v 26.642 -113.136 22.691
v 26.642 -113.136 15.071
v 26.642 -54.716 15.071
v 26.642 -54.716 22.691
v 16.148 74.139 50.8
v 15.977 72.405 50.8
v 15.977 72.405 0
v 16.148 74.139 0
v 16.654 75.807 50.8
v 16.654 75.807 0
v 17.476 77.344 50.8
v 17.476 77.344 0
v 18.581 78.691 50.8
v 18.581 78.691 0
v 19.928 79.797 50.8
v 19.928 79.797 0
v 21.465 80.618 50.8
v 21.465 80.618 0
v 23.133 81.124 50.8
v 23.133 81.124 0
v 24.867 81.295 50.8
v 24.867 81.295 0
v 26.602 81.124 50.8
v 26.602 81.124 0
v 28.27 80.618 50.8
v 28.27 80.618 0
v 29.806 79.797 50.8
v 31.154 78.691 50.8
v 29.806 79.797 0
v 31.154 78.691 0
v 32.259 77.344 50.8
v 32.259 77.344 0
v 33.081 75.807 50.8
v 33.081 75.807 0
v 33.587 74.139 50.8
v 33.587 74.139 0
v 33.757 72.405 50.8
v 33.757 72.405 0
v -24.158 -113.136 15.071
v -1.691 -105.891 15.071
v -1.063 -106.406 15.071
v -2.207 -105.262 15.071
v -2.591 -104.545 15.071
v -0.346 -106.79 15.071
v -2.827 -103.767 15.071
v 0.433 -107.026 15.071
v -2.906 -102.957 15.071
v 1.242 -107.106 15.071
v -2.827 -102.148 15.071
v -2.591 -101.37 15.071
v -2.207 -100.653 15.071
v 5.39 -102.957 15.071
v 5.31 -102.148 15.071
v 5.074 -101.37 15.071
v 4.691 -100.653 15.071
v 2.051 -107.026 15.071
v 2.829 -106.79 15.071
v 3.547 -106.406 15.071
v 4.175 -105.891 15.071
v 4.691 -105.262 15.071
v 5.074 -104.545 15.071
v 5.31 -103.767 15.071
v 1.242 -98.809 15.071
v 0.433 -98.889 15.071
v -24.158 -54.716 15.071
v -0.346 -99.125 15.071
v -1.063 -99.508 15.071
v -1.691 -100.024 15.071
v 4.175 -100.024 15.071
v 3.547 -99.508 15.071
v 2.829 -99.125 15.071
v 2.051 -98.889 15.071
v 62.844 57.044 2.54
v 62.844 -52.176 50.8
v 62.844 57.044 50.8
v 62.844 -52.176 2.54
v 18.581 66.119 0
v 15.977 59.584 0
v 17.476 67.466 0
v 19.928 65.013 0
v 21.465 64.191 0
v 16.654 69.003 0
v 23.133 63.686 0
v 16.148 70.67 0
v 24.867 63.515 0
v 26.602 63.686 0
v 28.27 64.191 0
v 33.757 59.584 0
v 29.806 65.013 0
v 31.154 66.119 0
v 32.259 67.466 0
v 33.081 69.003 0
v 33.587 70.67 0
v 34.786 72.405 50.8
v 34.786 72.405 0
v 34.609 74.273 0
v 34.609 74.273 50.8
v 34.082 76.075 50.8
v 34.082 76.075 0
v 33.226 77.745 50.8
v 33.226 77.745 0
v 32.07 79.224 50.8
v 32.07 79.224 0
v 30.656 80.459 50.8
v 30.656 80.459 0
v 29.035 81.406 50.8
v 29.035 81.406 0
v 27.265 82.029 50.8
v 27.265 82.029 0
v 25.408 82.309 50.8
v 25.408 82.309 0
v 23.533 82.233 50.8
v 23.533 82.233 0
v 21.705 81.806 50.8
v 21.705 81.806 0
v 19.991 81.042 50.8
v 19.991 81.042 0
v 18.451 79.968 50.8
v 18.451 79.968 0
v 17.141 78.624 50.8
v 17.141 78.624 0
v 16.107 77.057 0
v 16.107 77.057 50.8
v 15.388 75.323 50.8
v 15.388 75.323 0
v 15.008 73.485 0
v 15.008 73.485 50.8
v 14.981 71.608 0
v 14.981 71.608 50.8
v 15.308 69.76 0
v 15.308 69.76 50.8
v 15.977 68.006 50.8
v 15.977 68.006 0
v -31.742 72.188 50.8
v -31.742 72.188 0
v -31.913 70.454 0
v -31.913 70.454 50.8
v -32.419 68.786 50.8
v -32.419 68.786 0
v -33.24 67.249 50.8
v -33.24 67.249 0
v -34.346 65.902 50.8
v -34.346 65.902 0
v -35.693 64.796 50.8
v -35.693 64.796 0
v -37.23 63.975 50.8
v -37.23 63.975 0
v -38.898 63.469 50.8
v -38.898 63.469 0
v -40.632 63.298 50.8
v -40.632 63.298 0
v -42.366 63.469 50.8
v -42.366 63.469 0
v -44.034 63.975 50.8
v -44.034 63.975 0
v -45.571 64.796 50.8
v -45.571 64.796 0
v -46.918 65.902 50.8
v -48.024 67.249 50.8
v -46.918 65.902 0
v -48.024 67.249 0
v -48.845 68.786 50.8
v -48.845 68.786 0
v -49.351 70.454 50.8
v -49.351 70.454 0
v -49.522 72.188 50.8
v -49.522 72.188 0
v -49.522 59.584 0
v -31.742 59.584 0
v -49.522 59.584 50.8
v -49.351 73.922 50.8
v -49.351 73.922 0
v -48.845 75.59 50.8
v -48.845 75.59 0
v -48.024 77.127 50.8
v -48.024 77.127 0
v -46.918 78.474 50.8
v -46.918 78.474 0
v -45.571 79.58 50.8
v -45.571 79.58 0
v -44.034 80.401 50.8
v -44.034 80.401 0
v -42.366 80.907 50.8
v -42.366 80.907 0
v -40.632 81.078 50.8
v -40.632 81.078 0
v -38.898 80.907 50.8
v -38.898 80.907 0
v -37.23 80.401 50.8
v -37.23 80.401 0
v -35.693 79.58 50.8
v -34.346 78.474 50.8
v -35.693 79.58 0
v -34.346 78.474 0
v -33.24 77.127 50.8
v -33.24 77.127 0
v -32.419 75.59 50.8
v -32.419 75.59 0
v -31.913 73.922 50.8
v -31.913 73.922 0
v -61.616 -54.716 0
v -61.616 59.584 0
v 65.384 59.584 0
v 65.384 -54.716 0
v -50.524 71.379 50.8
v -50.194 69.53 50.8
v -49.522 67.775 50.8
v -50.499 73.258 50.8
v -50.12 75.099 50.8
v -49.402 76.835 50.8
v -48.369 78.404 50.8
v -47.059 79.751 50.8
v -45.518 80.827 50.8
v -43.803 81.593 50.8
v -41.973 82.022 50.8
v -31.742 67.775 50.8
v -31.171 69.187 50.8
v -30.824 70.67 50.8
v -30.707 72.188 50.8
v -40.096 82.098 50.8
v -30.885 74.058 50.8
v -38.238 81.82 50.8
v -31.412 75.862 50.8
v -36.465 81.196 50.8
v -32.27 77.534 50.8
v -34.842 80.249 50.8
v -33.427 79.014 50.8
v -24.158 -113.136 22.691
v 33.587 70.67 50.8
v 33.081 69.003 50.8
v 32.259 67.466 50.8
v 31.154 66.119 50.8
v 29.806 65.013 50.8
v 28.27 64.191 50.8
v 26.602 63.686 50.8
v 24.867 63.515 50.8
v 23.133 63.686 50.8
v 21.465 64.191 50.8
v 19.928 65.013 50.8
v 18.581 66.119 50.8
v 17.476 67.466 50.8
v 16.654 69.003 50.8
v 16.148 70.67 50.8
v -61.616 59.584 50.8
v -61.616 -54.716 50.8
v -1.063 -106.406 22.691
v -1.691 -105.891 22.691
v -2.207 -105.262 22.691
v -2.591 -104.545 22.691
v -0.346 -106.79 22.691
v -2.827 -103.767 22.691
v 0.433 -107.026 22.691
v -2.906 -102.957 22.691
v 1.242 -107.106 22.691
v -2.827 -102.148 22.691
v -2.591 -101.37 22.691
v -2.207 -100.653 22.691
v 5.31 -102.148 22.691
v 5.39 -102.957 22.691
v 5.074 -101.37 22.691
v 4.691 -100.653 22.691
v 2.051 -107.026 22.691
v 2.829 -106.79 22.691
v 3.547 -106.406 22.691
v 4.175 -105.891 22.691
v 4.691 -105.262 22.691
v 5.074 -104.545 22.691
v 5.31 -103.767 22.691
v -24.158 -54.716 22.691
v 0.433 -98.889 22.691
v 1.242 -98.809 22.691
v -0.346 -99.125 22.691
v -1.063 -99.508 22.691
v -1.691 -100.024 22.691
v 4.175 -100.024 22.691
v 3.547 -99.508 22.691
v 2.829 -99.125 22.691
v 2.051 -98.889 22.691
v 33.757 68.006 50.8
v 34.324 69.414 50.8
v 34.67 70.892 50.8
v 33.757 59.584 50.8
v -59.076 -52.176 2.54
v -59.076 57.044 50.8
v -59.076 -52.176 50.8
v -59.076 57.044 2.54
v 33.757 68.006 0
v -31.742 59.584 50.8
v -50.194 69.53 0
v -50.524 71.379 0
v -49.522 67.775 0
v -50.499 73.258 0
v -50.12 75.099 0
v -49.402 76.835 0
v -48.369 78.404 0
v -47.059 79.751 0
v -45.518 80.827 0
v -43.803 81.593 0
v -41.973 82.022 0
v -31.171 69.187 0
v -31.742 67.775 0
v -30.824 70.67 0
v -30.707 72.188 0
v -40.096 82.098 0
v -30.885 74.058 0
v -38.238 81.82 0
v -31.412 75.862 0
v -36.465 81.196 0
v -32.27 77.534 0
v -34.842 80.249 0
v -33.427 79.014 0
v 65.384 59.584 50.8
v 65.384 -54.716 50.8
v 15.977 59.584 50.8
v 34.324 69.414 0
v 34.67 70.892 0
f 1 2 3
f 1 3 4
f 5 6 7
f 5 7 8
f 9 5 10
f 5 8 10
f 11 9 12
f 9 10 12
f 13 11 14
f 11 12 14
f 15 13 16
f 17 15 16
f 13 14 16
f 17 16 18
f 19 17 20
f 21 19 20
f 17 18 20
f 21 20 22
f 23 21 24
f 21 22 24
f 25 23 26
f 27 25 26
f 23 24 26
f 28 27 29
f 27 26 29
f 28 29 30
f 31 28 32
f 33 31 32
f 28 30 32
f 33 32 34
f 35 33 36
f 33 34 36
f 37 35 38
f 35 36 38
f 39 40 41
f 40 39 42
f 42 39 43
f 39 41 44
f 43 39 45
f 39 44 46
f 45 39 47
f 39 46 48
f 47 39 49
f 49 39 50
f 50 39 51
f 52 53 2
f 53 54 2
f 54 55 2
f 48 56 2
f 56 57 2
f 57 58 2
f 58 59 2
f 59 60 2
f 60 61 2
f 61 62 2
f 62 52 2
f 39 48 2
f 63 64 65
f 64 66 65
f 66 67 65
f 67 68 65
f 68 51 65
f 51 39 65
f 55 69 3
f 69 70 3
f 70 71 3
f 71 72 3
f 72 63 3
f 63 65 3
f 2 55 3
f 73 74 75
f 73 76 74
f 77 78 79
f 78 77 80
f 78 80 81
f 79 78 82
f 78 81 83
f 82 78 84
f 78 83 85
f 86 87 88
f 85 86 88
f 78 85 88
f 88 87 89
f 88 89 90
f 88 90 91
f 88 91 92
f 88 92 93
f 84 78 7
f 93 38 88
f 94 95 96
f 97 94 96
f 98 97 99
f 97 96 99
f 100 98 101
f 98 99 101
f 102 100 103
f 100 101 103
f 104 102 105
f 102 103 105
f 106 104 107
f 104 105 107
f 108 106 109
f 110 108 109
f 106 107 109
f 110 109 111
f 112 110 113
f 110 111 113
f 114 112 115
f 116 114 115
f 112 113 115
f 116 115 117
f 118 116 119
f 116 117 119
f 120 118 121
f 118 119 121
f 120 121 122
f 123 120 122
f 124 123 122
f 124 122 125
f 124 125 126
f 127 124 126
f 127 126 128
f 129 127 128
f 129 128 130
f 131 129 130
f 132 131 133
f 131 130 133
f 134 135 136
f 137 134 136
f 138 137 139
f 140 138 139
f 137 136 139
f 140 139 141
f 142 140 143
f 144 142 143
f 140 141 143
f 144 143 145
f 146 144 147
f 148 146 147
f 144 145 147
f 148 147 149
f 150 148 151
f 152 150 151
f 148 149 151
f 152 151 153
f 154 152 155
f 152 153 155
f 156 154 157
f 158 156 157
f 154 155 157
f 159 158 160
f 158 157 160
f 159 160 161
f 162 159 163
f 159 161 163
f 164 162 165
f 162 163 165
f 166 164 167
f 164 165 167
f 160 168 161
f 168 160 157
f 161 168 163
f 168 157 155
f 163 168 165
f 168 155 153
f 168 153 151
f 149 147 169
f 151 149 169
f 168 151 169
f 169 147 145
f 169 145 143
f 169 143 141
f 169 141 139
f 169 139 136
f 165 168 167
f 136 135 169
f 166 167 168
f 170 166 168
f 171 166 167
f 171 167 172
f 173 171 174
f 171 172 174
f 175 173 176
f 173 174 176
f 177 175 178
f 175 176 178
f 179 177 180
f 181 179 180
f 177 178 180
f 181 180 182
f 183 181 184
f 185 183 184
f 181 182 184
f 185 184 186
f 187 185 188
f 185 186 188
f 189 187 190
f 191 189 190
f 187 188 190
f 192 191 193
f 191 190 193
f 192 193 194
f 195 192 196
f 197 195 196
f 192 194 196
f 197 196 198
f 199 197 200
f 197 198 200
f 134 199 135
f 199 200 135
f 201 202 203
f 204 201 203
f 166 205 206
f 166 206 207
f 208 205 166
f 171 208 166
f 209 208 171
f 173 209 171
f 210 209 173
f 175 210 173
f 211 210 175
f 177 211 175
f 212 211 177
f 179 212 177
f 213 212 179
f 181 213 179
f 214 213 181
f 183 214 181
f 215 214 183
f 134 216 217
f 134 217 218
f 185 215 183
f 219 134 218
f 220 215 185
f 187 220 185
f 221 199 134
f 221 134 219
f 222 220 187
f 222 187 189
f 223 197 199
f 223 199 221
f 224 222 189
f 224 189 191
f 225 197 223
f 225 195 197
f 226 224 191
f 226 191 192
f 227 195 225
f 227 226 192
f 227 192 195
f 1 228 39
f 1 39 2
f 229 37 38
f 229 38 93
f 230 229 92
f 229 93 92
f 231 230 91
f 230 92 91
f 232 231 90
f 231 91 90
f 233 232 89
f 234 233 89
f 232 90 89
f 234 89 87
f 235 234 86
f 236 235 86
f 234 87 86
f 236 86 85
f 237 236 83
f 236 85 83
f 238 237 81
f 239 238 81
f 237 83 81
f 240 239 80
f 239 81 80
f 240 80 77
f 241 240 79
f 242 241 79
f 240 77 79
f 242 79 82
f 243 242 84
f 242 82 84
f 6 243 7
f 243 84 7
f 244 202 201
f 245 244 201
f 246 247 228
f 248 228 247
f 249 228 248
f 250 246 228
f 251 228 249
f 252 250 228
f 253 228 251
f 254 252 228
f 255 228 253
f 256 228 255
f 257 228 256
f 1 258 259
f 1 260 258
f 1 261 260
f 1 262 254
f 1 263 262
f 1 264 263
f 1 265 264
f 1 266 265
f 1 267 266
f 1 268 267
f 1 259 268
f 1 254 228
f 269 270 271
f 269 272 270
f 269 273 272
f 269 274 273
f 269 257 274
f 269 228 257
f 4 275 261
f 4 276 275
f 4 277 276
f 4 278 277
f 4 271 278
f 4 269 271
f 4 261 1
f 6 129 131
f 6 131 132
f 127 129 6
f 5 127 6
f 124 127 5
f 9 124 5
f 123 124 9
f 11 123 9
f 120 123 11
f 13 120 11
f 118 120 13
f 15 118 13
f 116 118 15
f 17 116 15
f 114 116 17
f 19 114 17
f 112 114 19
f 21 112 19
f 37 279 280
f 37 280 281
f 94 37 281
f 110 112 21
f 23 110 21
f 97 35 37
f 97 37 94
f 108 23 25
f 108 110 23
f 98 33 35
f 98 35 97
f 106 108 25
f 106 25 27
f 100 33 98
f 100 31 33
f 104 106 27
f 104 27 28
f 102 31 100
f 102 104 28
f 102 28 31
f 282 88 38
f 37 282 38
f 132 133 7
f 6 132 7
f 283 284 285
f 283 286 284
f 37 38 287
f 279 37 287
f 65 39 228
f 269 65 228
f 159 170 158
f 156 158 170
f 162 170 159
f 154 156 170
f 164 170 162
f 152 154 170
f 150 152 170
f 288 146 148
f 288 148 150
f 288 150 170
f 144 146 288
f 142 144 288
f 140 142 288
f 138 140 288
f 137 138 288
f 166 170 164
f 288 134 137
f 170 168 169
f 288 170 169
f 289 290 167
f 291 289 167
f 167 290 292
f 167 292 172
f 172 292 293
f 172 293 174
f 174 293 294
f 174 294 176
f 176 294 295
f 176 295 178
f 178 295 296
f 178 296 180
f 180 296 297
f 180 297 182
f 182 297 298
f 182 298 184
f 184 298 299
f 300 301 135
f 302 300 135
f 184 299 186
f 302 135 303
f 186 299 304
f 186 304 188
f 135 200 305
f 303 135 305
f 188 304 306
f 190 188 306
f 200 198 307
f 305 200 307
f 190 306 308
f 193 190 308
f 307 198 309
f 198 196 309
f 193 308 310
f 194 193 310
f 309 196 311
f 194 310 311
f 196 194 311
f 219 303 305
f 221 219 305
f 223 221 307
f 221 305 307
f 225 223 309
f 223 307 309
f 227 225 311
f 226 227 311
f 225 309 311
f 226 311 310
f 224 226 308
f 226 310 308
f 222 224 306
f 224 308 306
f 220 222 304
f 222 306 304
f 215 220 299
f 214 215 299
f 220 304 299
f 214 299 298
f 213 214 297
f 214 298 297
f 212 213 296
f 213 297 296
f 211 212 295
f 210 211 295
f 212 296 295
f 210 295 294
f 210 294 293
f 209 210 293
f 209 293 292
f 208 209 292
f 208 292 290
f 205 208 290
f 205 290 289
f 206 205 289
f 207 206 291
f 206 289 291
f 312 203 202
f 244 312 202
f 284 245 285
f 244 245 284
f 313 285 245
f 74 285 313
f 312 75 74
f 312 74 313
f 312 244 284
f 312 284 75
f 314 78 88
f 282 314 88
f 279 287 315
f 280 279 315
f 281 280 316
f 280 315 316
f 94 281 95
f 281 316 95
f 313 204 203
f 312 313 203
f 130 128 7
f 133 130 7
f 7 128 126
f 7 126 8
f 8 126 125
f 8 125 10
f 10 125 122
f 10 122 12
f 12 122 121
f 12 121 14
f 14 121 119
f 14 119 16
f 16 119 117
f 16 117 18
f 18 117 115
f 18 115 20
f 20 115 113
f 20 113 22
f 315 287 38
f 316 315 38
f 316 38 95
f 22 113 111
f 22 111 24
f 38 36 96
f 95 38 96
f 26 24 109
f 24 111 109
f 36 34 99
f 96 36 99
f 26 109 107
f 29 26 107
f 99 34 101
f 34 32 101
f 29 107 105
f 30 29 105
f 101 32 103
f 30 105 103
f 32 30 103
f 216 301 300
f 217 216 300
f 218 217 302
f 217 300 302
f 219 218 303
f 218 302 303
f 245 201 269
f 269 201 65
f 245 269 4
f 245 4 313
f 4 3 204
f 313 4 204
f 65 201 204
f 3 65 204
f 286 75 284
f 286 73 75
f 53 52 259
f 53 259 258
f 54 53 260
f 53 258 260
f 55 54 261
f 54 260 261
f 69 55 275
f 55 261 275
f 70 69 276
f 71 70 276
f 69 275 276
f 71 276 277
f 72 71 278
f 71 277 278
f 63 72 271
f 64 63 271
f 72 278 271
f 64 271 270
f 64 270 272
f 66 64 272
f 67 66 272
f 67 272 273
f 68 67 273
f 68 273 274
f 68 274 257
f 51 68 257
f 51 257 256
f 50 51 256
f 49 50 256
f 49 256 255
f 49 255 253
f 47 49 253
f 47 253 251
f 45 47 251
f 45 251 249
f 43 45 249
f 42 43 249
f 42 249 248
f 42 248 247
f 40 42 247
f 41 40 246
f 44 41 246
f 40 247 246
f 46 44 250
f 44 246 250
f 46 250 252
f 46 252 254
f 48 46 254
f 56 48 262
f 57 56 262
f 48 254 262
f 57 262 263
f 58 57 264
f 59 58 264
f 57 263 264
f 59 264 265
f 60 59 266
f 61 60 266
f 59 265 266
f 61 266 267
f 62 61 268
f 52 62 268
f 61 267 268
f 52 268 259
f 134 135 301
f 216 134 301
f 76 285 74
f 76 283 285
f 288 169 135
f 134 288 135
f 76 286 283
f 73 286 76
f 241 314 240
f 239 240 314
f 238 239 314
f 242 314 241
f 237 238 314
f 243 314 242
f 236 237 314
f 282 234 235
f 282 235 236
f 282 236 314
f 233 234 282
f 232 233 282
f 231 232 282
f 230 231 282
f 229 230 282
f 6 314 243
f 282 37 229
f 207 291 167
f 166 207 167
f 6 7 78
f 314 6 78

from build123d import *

# Parameters (mm, degrees)
F1_DEPTH = 50.8
F2_DEPTH = 50.8
F3_DEPTH = 50.8
F4_T     = -2.54
F5_W     = 50.8
F5_H     = 7.62
F6_DEPTH = 58.42
F7_R     = 4.1483124282
F8_DEPTH = 25.4


with BuildPart() as f1:
    # F0 (on Top) → F1 (new body)
    with BuildSketch(Plane.XY):
        Polygon((-61.6161076576, 59.5836986993), (-61.6161076576, -54.7163013007), (65.3838923424, -54.7163013007), (65.3838923424, 59.5836986993), (33.7574713075, 59.5836986993), (15.9774713075, 59.5836986993), (-31.741853044, 59.5836986993), (-49.521853044, 59.5836986993), align=None)
    extrude(amount=F1_DEPTH)

    # F4
    f4_openings = [f1.faces().sort_by_distance(p)[0] for p in [
        (1.883892, 2.433699, 50.8),
    ]]
    offset(amount=F4_T, openings=f4_openings)

    # F5 (on face) → F6 (join)
    with BuildSketch(Plane.XZ.offset(54.7163013007)):
        with Locations((1.2418556303, 18.8811359456)):
            Rectangle(F5_W, F5_H)
    extrude(amount=F6_DEPTH)

    # F7 (on face) → F8 (cut)
    with BuildSketch(Plane.XY.offset(22.6911359456)):
        with Locations((1.2418556303, -102.957226336)):
            Circle(F7_R)
    extrude(amount=-F8_DEPTH, mode=Mode.SUBTRACT)


with BuildPart() as f2:
    # F0 (on Top) → F2 (new body)
    with BuildSketch(Plane.XY):
        with BuildLine():
            Line((-49.521853044, 72.1879079938), (-49.521853044, 67.7750018362))
            ThreePointArc((-49.521853044, 67.7750018362), (-40.631853044, 62.2628971245), (-31.741853044, 67.7750018362))
            Line((-31.741853044, 67.7750018362), (-31.741853044, 72.1879079938))
            ThreePointArc((-31.741853044, 72.1879079938), (-40.631853044, 63.2979079938), (-49.521853044, 72.1879079938))
        make_face()
        with BuildLine():
            Line((-49.521853044, 67.7750018362), (-49.521853044, 59.5836986993))
            Line((-49.521853044, 59.5836986993), (-31.741853044, 59.5836986993))
            Line((-31.741853044, 59.5836986993), (-31.741853044, 67.7750018362))
            ThreePointArc((-31.741853044, 67.7750018362), (-40.631853044, 62.2628971245), (-49.521853044, 67.7750018362))
        make_face()
    extrude(amount=F2_DEPTH)


with BuildPart() as f2b:
    # F0 (on Top) → F2, piece 2 (new body)
    with BuildSketch(Plane.XY):
        with BuildLine():
            ThreePointArc((15.9774713075, 68.0060928552), (24.8674713075, 62.4860869444), (33.7574713075, 68.0060928552))
            Line((33.7574713075, 68.0060928552), (33.7574713075, 72.4047869444))
            ThreePointArc((33.7574713075, 72.4047869444), (24.8674713075, 63.5147869444), (15.9774713075, 72.4047869444))
            Line((15.9774713075, 72.4047869444), (15.9774713075, 68.0060928552))
        make_face()
        with BuildLine():
            Line((15.9774713075, 59.5836986993), (33.7574713075, 59.5836986993))
            Line((33.7574713075, 59.5836986993), (33.7574713075, 68.0060928552))
            ThreePointArc((33.7574713075, 68.0060928552), (24.8674713075, 62.4860869444), (15.9774713075, 68.0060928552))
            Line((15.9774713075, 68.0060928552), (15.9774713075, 59.5836986993))
        make_face()
    extrude(amount=F2_DEPTH)


with BuildPart() as f3:
    # F0 (on Top) → F3 (new body)
    with BuildSketch(Plane.XY):
        with BuildLine():
            ThreePointArc((-30.7068421747, 72.1879079938), (-42.8981820281, 81.8507022942), (-49.521853044, 67.7750018362))
            Line((-49.521853044, 67.7750018362), (-49.521853044, 72.1879079938))
            ThreePointArc((-49.521853044, 72.1879079938), (-40.631853044, 81.0779079938), (-31.741853044, 72.1879079938))
            Line((-31.741853044, 72.1879079938), (-31.741853044, 67.7750018362))
            ThreePointArc((-31.741853044, 67.7750018362), (-30.9690587436, 69.9215790098), (-30.7068421747, 72.1879079938))
        make_face()
    extrude(amount=F3_DEPTH)


with BuildPart() as f3b:
    # F0 (on Top) → F3, piece 2 (new body)
    with BuildSketch(Plane.XY):
        with BuildLine():
            Line((33.7574713075, 72.4047869444), (33.7574713075, 68.0060928552))
            ThreePointArc((33.7574713075, 68.0060928552), (34.5255728987, 70.1460963182), (34.7861713075, 72.4047869444))
            ThreePointArc((34.7861713075, 72.4047869444), (22.6087806813, 82.0628885355), (15.9774713075, 68.0060928552))
            Line((15.9774713075, 68.0060928552), (15.9774713075, 72.4047869444))
            ThreePointArc((15.9774713075, 72.4047869444), (24.8674713075, 81.2947869444), (33.7574713075, 72.4047869444))
        make_face()
    extrude(amount=F3_DEPTH)


solid = Compound([f1.part, f2.part, f2b.part, f3.part, f3b.part])
